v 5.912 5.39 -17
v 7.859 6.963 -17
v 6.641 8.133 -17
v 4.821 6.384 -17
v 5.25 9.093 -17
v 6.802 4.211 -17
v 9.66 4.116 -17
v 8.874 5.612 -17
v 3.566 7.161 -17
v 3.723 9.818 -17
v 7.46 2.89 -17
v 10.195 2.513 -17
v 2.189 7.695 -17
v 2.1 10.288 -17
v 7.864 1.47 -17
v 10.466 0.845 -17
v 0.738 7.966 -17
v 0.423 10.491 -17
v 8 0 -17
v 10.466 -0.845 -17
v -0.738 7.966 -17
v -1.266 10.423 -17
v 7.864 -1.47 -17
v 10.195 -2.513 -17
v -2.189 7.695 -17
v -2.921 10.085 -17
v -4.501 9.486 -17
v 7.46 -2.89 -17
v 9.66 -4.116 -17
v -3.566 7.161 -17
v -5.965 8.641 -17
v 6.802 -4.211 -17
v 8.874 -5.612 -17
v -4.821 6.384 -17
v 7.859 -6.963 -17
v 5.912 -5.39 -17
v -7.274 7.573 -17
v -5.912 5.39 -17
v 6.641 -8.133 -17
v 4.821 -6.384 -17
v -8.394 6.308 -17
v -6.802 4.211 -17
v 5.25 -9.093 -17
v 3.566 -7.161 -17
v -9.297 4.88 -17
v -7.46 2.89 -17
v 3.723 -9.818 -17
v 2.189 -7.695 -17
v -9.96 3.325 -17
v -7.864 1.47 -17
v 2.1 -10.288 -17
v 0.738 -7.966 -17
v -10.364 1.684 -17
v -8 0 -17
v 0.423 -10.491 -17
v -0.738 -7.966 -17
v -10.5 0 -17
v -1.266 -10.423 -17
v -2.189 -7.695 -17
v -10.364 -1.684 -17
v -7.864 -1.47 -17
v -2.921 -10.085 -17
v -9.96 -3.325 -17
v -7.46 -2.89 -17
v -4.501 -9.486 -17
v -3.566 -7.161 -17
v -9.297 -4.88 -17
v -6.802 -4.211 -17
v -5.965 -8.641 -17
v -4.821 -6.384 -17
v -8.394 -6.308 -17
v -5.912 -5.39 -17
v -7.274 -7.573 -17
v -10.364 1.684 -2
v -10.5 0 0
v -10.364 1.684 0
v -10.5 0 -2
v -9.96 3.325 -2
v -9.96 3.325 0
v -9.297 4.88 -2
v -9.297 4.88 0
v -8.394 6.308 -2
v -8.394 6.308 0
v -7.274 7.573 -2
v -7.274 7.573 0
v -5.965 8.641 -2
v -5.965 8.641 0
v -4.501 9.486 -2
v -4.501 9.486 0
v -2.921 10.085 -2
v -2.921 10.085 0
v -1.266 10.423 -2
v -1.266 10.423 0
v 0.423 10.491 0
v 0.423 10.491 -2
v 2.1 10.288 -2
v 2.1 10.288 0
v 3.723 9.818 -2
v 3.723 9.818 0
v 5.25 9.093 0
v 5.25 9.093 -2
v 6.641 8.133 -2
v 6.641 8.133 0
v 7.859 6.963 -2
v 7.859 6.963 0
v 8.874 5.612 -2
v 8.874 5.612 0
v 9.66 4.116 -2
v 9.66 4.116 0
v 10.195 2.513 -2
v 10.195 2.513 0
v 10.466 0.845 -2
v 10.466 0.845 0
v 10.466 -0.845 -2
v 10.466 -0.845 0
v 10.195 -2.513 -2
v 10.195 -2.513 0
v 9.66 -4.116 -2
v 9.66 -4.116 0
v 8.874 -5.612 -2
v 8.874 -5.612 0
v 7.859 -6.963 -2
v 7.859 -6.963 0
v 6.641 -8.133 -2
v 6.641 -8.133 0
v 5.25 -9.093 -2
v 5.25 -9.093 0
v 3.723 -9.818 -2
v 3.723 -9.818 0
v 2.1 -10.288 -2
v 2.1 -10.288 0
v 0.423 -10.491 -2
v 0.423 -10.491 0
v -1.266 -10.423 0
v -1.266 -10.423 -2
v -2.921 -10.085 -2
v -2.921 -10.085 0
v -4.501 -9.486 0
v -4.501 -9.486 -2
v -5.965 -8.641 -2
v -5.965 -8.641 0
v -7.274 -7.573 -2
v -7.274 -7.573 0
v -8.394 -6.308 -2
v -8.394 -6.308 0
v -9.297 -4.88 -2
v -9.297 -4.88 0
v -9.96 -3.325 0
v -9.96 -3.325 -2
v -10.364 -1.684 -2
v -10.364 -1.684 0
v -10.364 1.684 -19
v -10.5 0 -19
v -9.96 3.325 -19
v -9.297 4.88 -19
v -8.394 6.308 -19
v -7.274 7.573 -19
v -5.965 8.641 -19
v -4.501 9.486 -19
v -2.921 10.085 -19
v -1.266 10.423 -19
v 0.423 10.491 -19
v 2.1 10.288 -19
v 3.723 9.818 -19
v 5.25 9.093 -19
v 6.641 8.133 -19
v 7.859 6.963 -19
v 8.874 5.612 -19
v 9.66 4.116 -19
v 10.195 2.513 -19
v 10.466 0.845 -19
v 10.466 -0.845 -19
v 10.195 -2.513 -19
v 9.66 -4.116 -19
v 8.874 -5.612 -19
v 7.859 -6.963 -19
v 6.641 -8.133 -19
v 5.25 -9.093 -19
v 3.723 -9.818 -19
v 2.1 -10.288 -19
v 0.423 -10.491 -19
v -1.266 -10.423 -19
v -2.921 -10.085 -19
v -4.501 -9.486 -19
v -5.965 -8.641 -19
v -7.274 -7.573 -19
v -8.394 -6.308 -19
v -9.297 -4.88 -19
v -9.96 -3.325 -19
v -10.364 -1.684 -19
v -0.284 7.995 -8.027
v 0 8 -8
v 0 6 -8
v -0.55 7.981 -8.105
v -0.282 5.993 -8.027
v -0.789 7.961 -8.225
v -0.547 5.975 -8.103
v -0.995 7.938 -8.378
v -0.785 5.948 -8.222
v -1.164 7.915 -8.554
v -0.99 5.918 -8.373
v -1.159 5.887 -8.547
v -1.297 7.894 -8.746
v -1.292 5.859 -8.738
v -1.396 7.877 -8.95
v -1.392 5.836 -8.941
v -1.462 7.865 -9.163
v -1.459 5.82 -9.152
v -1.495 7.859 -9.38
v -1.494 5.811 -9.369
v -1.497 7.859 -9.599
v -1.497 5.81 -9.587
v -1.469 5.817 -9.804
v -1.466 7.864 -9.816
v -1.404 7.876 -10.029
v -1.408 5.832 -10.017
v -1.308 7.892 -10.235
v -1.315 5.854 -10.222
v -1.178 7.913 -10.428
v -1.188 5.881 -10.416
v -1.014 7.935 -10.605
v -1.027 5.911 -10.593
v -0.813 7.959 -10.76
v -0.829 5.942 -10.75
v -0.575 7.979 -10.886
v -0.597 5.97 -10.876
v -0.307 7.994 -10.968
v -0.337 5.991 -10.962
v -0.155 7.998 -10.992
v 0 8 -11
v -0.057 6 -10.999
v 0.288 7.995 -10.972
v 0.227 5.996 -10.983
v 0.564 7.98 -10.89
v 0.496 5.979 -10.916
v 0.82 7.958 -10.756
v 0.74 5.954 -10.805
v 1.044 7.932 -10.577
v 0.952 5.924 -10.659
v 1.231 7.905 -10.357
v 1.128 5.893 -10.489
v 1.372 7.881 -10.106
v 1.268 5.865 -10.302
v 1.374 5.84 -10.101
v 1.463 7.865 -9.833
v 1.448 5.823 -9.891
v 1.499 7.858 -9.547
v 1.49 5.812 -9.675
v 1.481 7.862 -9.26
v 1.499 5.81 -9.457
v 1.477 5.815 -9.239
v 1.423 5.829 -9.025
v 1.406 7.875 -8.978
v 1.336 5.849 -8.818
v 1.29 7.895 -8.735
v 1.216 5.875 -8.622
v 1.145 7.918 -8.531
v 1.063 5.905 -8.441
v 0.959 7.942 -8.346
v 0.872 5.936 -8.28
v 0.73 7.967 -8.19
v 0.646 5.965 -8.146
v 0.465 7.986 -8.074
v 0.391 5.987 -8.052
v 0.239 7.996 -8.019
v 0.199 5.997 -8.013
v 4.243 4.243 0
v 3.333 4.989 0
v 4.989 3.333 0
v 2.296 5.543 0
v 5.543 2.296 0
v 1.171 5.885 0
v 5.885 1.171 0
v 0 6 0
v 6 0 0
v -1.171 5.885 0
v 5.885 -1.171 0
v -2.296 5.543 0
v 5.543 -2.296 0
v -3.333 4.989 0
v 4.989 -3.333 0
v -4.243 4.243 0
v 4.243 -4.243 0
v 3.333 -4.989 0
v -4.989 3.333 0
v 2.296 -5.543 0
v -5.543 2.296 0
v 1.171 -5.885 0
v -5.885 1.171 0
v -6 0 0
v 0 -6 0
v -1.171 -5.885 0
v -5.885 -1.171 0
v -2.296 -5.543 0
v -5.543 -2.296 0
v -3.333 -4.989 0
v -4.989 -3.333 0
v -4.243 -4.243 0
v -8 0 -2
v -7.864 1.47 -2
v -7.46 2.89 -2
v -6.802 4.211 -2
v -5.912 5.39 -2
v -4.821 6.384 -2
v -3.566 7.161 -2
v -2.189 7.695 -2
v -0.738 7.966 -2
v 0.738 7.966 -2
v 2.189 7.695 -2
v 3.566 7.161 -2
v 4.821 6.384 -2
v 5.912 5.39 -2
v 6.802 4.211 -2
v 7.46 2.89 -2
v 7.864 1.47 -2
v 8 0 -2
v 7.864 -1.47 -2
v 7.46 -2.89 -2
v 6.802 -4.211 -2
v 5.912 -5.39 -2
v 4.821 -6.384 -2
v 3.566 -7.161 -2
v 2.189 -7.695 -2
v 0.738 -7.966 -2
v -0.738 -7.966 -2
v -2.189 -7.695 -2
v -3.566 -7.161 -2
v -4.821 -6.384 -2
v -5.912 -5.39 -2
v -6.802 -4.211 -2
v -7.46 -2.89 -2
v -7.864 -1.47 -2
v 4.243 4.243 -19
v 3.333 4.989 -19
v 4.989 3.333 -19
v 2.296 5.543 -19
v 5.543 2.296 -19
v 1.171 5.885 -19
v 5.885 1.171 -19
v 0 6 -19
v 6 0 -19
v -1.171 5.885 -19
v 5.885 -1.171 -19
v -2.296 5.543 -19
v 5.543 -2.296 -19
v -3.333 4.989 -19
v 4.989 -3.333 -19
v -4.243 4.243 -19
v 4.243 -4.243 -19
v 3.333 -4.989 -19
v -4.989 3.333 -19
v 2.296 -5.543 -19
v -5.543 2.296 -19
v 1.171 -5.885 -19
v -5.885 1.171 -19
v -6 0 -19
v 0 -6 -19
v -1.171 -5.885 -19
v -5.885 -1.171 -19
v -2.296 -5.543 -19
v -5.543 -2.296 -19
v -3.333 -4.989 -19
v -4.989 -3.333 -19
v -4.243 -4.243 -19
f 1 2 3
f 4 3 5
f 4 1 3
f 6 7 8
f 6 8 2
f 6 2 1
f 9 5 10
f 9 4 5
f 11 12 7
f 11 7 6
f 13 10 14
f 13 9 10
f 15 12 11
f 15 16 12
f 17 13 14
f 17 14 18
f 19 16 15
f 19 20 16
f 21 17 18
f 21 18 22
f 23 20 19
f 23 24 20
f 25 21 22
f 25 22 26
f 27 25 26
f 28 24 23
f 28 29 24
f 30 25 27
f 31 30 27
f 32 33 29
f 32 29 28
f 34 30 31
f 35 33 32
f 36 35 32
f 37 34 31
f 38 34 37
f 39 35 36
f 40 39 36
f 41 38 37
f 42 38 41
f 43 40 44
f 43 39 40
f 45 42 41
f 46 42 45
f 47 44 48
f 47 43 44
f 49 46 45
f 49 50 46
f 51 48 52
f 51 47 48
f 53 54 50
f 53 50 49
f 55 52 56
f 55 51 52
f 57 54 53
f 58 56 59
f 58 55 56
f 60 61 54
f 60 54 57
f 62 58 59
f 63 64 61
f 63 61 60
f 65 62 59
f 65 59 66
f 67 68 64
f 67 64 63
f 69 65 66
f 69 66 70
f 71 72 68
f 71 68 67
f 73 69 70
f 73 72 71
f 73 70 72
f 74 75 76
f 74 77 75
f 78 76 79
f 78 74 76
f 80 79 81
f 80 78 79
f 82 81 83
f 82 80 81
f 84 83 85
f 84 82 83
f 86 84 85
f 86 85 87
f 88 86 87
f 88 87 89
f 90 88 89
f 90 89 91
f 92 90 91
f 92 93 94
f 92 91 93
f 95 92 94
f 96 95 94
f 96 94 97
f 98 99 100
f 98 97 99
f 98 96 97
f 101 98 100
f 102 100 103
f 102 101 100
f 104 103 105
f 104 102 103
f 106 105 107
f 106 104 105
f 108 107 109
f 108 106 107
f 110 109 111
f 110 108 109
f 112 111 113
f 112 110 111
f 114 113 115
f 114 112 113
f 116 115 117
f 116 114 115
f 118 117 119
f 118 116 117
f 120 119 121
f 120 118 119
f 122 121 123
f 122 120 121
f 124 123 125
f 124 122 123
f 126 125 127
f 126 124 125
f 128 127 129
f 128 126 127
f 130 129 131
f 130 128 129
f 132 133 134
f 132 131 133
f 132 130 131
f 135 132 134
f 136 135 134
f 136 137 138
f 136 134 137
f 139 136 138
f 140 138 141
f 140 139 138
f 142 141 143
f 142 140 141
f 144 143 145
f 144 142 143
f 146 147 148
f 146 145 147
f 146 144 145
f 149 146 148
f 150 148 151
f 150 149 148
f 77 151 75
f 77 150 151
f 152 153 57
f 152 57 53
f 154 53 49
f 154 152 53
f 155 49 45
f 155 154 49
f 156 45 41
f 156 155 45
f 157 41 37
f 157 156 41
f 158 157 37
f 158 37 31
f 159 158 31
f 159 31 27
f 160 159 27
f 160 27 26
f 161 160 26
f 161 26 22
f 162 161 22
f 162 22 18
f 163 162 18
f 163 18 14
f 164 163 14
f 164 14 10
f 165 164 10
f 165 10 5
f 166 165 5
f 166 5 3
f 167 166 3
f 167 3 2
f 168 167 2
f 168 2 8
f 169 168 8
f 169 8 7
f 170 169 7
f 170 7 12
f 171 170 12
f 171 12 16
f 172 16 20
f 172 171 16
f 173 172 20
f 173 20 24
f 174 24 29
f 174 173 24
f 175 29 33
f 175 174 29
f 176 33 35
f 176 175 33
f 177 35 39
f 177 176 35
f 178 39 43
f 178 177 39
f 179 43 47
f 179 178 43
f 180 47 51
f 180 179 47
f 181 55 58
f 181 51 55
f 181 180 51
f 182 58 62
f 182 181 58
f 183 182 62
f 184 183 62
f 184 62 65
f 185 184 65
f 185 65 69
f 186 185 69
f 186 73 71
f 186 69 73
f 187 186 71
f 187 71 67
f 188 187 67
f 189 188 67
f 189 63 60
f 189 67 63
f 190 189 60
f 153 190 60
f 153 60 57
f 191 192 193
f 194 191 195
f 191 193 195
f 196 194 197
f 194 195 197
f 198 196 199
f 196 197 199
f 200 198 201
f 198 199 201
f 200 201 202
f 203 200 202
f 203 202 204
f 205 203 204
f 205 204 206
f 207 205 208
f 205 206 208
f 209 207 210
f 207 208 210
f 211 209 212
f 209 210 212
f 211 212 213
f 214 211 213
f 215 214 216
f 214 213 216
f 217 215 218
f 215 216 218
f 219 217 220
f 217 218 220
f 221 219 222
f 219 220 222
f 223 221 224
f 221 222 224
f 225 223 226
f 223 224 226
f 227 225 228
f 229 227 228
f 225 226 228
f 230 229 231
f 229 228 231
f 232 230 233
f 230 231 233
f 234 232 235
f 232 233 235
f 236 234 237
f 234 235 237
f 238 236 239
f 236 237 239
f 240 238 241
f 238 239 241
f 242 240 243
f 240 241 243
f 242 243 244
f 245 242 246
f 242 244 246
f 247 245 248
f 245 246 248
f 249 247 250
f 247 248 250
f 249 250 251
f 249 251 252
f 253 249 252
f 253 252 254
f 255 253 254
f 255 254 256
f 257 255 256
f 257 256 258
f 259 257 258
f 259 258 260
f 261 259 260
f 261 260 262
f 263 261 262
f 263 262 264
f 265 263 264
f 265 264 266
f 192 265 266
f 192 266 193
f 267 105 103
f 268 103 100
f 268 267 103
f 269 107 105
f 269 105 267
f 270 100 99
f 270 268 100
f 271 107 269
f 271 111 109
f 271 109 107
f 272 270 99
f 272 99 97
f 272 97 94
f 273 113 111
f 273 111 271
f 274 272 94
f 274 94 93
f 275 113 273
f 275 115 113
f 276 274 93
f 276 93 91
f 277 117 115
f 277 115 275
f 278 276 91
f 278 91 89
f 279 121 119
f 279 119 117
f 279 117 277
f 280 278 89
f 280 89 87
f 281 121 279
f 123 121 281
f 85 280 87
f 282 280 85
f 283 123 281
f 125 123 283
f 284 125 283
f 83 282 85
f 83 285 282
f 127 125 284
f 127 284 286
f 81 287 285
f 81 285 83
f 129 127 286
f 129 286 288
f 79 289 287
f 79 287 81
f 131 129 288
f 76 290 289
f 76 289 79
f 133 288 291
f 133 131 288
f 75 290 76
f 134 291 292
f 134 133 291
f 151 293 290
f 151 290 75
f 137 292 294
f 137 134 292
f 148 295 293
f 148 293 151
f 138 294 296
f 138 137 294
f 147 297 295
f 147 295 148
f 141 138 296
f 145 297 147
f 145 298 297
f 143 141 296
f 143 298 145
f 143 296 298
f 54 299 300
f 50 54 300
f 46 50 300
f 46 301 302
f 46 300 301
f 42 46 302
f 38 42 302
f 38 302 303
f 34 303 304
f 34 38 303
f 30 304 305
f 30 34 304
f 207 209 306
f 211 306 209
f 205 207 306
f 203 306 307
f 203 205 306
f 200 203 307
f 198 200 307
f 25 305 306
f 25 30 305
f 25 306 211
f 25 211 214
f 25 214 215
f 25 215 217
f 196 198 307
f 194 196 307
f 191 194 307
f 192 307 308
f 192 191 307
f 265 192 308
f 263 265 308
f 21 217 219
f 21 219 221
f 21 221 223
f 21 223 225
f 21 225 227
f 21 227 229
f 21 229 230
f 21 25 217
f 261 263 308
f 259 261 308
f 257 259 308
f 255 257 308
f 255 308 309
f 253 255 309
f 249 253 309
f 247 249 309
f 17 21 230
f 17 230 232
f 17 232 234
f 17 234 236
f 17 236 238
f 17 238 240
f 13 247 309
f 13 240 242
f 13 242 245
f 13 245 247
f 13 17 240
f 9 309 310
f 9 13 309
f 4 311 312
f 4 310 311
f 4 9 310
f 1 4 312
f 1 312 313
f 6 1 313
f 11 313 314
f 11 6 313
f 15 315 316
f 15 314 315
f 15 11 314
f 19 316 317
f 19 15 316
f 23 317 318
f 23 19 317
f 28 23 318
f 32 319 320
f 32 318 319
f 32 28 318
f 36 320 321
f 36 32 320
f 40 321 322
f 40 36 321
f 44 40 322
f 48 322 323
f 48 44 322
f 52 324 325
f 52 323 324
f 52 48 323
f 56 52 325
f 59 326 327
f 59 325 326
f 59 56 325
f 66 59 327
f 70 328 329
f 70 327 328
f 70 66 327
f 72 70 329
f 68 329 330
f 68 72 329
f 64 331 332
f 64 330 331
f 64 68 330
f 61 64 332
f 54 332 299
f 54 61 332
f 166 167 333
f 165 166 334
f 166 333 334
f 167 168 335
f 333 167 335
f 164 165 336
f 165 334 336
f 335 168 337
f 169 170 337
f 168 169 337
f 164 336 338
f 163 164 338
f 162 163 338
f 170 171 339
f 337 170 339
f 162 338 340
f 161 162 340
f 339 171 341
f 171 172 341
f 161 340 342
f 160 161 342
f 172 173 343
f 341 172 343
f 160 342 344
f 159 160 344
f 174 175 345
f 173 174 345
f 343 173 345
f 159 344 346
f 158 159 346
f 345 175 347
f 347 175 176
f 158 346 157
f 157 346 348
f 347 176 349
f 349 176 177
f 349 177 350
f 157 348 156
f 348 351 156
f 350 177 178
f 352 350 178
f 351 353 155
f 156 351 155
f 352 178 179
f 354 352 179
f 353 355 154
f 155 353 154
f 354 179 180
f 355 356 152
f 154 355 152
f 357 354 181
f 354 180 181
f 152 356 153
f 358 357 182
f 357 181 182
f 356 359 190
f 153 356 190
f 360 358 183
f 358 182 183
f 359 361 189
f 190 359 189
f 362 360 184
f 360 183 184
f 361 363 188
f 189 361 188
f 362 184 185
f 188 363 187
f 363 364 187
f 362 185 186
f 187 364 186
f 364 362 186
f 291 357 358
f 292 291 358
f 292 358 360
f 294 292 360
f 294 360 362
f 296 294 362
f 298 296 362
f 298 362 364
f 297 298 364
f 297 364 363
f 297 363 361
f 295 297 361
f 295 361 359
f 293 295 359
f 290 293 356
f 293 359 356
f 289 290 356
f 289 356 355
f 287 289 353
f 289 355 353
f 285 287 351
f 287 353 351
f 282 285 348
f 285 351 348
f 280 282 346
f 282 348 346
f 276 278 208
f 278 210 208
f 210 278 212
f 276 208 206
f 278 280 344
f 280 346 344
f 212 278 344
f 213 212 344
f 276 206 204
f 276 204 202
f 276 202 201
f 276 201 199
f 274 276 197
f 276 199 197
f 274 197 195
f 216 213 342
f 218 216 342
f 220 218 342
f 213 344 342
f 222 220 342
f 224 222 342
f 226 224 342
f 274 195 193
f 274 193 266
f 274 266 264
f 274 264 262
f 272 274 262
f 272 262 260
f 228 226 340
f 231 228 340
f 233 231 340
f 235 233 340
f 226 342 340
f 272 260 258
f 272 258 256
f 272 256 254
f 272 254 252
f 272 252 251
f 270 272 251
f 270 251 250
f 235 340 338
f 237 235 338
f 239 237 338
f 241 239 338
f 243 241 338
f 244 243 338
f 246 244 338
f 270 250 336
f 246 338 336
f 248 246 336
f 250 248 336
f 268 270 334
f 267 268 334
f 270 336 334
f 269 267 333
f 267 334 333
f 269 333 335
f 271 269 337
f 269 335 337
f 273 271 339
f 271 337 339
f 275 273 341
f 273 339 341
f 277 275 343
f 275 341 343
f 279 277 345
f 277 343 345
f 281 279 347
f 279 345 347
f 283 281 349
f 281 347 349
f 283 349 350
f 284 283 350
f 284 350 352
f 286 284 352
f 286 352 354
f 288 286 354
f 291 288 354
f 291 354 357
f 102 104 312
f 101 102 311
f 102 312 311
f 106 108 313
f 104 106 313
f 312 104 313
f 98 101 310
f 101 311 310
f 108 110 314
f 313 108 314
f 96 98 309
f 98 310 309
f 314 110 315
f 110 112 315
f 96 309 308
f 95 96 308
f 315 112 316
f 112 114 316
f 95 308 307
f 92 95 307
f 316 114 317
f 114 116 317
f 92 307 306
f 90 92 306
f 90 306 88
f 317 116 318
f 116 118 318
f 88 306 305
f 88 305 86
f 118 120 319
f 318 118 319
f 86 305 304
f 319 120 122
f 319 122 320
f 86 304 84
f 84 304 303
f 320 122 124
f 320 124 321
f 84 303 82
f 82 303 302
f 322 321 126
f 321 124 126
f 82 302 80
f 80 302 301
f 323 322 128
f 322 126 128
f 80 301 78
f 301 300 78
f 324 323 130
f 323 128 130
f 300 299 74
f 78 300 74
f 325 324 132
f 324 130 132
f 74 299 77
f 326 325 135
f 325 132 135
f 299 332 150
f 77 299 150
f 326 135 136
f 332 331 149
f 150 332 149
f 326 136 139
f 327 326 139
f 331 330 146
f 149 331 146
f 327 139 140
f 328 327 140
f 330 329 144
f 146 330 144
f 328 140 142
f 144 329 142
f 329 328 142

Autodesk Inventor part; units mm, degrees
ref_plane "YZ Plane" through (0, 0, 0) normal (1, 0, 0) x (0, 1, 0)
ref_plane "XY Plane" through (0, 0, 0) normal (0, 0, 1) x (1, 0, 0)
sketch "Skizze1" plane through (0, 0, 0) normal (0, 1, 0) x (-1, 0, 0)
  line L0 (0, 0) -> (10.5, 0)
  line L1 (10.5, 0) -> (10.5, -2)
  line L2 (10.5, -2) -> (8, -2)
  line L3 (8, -2) -> (8, -17)
  line L4 (8, -17) -> (10.5, -17)
  line L5 (10.5, -17) -> (10.5, -19)
  line L6 (10.5, -19) -> (0, -19)
  line L7 (0, -19) -> (0, 0)
  point P0 (0, -9.5)
  dimension "d0" = 2
  dimension "d1" = 2
  dimension "d2" = 21
  dimension "d3" = 16
  dimension "d4" = 19
revolve "Umdrehung1" add sketch "Skizze1" angle 360 about axis through (0, 0, -19) along (0, 0, 1)
sketch "Skizze2" plane through (0, 0, 0) normal (0, 0, 1) x (1, 0, 0)
  circle A0 centre (0, 0) radius 10.5 projected
  point P0 (0, 0)
hole "Bohrung1" at (0, 0, 0) direction (0, 0, -1) diameter 12 end through all
ref_plane "Arbeitsebene1" through (0, 8, 0) normal (0, 1, 0) x (-1, 0, 0)
sketch "Skizze3" plane through (0, 8, 0) normal (0, 1, 0) x (-1, 0, 0)
  line L0 (10.5, 0) -> (-10.5, 0) projected
  point P0 (0, 0)
  point P1 (0, -9.5)
  point P2 (0, 0)
  dimension "d14" = 9.5
hole "Bohrung2" at (0, 8, -9.5) direction (0, -1, 0) diameter 3 depth 5
equation "\"d1\" = d0"
properties part number "2033" material "Blei"
